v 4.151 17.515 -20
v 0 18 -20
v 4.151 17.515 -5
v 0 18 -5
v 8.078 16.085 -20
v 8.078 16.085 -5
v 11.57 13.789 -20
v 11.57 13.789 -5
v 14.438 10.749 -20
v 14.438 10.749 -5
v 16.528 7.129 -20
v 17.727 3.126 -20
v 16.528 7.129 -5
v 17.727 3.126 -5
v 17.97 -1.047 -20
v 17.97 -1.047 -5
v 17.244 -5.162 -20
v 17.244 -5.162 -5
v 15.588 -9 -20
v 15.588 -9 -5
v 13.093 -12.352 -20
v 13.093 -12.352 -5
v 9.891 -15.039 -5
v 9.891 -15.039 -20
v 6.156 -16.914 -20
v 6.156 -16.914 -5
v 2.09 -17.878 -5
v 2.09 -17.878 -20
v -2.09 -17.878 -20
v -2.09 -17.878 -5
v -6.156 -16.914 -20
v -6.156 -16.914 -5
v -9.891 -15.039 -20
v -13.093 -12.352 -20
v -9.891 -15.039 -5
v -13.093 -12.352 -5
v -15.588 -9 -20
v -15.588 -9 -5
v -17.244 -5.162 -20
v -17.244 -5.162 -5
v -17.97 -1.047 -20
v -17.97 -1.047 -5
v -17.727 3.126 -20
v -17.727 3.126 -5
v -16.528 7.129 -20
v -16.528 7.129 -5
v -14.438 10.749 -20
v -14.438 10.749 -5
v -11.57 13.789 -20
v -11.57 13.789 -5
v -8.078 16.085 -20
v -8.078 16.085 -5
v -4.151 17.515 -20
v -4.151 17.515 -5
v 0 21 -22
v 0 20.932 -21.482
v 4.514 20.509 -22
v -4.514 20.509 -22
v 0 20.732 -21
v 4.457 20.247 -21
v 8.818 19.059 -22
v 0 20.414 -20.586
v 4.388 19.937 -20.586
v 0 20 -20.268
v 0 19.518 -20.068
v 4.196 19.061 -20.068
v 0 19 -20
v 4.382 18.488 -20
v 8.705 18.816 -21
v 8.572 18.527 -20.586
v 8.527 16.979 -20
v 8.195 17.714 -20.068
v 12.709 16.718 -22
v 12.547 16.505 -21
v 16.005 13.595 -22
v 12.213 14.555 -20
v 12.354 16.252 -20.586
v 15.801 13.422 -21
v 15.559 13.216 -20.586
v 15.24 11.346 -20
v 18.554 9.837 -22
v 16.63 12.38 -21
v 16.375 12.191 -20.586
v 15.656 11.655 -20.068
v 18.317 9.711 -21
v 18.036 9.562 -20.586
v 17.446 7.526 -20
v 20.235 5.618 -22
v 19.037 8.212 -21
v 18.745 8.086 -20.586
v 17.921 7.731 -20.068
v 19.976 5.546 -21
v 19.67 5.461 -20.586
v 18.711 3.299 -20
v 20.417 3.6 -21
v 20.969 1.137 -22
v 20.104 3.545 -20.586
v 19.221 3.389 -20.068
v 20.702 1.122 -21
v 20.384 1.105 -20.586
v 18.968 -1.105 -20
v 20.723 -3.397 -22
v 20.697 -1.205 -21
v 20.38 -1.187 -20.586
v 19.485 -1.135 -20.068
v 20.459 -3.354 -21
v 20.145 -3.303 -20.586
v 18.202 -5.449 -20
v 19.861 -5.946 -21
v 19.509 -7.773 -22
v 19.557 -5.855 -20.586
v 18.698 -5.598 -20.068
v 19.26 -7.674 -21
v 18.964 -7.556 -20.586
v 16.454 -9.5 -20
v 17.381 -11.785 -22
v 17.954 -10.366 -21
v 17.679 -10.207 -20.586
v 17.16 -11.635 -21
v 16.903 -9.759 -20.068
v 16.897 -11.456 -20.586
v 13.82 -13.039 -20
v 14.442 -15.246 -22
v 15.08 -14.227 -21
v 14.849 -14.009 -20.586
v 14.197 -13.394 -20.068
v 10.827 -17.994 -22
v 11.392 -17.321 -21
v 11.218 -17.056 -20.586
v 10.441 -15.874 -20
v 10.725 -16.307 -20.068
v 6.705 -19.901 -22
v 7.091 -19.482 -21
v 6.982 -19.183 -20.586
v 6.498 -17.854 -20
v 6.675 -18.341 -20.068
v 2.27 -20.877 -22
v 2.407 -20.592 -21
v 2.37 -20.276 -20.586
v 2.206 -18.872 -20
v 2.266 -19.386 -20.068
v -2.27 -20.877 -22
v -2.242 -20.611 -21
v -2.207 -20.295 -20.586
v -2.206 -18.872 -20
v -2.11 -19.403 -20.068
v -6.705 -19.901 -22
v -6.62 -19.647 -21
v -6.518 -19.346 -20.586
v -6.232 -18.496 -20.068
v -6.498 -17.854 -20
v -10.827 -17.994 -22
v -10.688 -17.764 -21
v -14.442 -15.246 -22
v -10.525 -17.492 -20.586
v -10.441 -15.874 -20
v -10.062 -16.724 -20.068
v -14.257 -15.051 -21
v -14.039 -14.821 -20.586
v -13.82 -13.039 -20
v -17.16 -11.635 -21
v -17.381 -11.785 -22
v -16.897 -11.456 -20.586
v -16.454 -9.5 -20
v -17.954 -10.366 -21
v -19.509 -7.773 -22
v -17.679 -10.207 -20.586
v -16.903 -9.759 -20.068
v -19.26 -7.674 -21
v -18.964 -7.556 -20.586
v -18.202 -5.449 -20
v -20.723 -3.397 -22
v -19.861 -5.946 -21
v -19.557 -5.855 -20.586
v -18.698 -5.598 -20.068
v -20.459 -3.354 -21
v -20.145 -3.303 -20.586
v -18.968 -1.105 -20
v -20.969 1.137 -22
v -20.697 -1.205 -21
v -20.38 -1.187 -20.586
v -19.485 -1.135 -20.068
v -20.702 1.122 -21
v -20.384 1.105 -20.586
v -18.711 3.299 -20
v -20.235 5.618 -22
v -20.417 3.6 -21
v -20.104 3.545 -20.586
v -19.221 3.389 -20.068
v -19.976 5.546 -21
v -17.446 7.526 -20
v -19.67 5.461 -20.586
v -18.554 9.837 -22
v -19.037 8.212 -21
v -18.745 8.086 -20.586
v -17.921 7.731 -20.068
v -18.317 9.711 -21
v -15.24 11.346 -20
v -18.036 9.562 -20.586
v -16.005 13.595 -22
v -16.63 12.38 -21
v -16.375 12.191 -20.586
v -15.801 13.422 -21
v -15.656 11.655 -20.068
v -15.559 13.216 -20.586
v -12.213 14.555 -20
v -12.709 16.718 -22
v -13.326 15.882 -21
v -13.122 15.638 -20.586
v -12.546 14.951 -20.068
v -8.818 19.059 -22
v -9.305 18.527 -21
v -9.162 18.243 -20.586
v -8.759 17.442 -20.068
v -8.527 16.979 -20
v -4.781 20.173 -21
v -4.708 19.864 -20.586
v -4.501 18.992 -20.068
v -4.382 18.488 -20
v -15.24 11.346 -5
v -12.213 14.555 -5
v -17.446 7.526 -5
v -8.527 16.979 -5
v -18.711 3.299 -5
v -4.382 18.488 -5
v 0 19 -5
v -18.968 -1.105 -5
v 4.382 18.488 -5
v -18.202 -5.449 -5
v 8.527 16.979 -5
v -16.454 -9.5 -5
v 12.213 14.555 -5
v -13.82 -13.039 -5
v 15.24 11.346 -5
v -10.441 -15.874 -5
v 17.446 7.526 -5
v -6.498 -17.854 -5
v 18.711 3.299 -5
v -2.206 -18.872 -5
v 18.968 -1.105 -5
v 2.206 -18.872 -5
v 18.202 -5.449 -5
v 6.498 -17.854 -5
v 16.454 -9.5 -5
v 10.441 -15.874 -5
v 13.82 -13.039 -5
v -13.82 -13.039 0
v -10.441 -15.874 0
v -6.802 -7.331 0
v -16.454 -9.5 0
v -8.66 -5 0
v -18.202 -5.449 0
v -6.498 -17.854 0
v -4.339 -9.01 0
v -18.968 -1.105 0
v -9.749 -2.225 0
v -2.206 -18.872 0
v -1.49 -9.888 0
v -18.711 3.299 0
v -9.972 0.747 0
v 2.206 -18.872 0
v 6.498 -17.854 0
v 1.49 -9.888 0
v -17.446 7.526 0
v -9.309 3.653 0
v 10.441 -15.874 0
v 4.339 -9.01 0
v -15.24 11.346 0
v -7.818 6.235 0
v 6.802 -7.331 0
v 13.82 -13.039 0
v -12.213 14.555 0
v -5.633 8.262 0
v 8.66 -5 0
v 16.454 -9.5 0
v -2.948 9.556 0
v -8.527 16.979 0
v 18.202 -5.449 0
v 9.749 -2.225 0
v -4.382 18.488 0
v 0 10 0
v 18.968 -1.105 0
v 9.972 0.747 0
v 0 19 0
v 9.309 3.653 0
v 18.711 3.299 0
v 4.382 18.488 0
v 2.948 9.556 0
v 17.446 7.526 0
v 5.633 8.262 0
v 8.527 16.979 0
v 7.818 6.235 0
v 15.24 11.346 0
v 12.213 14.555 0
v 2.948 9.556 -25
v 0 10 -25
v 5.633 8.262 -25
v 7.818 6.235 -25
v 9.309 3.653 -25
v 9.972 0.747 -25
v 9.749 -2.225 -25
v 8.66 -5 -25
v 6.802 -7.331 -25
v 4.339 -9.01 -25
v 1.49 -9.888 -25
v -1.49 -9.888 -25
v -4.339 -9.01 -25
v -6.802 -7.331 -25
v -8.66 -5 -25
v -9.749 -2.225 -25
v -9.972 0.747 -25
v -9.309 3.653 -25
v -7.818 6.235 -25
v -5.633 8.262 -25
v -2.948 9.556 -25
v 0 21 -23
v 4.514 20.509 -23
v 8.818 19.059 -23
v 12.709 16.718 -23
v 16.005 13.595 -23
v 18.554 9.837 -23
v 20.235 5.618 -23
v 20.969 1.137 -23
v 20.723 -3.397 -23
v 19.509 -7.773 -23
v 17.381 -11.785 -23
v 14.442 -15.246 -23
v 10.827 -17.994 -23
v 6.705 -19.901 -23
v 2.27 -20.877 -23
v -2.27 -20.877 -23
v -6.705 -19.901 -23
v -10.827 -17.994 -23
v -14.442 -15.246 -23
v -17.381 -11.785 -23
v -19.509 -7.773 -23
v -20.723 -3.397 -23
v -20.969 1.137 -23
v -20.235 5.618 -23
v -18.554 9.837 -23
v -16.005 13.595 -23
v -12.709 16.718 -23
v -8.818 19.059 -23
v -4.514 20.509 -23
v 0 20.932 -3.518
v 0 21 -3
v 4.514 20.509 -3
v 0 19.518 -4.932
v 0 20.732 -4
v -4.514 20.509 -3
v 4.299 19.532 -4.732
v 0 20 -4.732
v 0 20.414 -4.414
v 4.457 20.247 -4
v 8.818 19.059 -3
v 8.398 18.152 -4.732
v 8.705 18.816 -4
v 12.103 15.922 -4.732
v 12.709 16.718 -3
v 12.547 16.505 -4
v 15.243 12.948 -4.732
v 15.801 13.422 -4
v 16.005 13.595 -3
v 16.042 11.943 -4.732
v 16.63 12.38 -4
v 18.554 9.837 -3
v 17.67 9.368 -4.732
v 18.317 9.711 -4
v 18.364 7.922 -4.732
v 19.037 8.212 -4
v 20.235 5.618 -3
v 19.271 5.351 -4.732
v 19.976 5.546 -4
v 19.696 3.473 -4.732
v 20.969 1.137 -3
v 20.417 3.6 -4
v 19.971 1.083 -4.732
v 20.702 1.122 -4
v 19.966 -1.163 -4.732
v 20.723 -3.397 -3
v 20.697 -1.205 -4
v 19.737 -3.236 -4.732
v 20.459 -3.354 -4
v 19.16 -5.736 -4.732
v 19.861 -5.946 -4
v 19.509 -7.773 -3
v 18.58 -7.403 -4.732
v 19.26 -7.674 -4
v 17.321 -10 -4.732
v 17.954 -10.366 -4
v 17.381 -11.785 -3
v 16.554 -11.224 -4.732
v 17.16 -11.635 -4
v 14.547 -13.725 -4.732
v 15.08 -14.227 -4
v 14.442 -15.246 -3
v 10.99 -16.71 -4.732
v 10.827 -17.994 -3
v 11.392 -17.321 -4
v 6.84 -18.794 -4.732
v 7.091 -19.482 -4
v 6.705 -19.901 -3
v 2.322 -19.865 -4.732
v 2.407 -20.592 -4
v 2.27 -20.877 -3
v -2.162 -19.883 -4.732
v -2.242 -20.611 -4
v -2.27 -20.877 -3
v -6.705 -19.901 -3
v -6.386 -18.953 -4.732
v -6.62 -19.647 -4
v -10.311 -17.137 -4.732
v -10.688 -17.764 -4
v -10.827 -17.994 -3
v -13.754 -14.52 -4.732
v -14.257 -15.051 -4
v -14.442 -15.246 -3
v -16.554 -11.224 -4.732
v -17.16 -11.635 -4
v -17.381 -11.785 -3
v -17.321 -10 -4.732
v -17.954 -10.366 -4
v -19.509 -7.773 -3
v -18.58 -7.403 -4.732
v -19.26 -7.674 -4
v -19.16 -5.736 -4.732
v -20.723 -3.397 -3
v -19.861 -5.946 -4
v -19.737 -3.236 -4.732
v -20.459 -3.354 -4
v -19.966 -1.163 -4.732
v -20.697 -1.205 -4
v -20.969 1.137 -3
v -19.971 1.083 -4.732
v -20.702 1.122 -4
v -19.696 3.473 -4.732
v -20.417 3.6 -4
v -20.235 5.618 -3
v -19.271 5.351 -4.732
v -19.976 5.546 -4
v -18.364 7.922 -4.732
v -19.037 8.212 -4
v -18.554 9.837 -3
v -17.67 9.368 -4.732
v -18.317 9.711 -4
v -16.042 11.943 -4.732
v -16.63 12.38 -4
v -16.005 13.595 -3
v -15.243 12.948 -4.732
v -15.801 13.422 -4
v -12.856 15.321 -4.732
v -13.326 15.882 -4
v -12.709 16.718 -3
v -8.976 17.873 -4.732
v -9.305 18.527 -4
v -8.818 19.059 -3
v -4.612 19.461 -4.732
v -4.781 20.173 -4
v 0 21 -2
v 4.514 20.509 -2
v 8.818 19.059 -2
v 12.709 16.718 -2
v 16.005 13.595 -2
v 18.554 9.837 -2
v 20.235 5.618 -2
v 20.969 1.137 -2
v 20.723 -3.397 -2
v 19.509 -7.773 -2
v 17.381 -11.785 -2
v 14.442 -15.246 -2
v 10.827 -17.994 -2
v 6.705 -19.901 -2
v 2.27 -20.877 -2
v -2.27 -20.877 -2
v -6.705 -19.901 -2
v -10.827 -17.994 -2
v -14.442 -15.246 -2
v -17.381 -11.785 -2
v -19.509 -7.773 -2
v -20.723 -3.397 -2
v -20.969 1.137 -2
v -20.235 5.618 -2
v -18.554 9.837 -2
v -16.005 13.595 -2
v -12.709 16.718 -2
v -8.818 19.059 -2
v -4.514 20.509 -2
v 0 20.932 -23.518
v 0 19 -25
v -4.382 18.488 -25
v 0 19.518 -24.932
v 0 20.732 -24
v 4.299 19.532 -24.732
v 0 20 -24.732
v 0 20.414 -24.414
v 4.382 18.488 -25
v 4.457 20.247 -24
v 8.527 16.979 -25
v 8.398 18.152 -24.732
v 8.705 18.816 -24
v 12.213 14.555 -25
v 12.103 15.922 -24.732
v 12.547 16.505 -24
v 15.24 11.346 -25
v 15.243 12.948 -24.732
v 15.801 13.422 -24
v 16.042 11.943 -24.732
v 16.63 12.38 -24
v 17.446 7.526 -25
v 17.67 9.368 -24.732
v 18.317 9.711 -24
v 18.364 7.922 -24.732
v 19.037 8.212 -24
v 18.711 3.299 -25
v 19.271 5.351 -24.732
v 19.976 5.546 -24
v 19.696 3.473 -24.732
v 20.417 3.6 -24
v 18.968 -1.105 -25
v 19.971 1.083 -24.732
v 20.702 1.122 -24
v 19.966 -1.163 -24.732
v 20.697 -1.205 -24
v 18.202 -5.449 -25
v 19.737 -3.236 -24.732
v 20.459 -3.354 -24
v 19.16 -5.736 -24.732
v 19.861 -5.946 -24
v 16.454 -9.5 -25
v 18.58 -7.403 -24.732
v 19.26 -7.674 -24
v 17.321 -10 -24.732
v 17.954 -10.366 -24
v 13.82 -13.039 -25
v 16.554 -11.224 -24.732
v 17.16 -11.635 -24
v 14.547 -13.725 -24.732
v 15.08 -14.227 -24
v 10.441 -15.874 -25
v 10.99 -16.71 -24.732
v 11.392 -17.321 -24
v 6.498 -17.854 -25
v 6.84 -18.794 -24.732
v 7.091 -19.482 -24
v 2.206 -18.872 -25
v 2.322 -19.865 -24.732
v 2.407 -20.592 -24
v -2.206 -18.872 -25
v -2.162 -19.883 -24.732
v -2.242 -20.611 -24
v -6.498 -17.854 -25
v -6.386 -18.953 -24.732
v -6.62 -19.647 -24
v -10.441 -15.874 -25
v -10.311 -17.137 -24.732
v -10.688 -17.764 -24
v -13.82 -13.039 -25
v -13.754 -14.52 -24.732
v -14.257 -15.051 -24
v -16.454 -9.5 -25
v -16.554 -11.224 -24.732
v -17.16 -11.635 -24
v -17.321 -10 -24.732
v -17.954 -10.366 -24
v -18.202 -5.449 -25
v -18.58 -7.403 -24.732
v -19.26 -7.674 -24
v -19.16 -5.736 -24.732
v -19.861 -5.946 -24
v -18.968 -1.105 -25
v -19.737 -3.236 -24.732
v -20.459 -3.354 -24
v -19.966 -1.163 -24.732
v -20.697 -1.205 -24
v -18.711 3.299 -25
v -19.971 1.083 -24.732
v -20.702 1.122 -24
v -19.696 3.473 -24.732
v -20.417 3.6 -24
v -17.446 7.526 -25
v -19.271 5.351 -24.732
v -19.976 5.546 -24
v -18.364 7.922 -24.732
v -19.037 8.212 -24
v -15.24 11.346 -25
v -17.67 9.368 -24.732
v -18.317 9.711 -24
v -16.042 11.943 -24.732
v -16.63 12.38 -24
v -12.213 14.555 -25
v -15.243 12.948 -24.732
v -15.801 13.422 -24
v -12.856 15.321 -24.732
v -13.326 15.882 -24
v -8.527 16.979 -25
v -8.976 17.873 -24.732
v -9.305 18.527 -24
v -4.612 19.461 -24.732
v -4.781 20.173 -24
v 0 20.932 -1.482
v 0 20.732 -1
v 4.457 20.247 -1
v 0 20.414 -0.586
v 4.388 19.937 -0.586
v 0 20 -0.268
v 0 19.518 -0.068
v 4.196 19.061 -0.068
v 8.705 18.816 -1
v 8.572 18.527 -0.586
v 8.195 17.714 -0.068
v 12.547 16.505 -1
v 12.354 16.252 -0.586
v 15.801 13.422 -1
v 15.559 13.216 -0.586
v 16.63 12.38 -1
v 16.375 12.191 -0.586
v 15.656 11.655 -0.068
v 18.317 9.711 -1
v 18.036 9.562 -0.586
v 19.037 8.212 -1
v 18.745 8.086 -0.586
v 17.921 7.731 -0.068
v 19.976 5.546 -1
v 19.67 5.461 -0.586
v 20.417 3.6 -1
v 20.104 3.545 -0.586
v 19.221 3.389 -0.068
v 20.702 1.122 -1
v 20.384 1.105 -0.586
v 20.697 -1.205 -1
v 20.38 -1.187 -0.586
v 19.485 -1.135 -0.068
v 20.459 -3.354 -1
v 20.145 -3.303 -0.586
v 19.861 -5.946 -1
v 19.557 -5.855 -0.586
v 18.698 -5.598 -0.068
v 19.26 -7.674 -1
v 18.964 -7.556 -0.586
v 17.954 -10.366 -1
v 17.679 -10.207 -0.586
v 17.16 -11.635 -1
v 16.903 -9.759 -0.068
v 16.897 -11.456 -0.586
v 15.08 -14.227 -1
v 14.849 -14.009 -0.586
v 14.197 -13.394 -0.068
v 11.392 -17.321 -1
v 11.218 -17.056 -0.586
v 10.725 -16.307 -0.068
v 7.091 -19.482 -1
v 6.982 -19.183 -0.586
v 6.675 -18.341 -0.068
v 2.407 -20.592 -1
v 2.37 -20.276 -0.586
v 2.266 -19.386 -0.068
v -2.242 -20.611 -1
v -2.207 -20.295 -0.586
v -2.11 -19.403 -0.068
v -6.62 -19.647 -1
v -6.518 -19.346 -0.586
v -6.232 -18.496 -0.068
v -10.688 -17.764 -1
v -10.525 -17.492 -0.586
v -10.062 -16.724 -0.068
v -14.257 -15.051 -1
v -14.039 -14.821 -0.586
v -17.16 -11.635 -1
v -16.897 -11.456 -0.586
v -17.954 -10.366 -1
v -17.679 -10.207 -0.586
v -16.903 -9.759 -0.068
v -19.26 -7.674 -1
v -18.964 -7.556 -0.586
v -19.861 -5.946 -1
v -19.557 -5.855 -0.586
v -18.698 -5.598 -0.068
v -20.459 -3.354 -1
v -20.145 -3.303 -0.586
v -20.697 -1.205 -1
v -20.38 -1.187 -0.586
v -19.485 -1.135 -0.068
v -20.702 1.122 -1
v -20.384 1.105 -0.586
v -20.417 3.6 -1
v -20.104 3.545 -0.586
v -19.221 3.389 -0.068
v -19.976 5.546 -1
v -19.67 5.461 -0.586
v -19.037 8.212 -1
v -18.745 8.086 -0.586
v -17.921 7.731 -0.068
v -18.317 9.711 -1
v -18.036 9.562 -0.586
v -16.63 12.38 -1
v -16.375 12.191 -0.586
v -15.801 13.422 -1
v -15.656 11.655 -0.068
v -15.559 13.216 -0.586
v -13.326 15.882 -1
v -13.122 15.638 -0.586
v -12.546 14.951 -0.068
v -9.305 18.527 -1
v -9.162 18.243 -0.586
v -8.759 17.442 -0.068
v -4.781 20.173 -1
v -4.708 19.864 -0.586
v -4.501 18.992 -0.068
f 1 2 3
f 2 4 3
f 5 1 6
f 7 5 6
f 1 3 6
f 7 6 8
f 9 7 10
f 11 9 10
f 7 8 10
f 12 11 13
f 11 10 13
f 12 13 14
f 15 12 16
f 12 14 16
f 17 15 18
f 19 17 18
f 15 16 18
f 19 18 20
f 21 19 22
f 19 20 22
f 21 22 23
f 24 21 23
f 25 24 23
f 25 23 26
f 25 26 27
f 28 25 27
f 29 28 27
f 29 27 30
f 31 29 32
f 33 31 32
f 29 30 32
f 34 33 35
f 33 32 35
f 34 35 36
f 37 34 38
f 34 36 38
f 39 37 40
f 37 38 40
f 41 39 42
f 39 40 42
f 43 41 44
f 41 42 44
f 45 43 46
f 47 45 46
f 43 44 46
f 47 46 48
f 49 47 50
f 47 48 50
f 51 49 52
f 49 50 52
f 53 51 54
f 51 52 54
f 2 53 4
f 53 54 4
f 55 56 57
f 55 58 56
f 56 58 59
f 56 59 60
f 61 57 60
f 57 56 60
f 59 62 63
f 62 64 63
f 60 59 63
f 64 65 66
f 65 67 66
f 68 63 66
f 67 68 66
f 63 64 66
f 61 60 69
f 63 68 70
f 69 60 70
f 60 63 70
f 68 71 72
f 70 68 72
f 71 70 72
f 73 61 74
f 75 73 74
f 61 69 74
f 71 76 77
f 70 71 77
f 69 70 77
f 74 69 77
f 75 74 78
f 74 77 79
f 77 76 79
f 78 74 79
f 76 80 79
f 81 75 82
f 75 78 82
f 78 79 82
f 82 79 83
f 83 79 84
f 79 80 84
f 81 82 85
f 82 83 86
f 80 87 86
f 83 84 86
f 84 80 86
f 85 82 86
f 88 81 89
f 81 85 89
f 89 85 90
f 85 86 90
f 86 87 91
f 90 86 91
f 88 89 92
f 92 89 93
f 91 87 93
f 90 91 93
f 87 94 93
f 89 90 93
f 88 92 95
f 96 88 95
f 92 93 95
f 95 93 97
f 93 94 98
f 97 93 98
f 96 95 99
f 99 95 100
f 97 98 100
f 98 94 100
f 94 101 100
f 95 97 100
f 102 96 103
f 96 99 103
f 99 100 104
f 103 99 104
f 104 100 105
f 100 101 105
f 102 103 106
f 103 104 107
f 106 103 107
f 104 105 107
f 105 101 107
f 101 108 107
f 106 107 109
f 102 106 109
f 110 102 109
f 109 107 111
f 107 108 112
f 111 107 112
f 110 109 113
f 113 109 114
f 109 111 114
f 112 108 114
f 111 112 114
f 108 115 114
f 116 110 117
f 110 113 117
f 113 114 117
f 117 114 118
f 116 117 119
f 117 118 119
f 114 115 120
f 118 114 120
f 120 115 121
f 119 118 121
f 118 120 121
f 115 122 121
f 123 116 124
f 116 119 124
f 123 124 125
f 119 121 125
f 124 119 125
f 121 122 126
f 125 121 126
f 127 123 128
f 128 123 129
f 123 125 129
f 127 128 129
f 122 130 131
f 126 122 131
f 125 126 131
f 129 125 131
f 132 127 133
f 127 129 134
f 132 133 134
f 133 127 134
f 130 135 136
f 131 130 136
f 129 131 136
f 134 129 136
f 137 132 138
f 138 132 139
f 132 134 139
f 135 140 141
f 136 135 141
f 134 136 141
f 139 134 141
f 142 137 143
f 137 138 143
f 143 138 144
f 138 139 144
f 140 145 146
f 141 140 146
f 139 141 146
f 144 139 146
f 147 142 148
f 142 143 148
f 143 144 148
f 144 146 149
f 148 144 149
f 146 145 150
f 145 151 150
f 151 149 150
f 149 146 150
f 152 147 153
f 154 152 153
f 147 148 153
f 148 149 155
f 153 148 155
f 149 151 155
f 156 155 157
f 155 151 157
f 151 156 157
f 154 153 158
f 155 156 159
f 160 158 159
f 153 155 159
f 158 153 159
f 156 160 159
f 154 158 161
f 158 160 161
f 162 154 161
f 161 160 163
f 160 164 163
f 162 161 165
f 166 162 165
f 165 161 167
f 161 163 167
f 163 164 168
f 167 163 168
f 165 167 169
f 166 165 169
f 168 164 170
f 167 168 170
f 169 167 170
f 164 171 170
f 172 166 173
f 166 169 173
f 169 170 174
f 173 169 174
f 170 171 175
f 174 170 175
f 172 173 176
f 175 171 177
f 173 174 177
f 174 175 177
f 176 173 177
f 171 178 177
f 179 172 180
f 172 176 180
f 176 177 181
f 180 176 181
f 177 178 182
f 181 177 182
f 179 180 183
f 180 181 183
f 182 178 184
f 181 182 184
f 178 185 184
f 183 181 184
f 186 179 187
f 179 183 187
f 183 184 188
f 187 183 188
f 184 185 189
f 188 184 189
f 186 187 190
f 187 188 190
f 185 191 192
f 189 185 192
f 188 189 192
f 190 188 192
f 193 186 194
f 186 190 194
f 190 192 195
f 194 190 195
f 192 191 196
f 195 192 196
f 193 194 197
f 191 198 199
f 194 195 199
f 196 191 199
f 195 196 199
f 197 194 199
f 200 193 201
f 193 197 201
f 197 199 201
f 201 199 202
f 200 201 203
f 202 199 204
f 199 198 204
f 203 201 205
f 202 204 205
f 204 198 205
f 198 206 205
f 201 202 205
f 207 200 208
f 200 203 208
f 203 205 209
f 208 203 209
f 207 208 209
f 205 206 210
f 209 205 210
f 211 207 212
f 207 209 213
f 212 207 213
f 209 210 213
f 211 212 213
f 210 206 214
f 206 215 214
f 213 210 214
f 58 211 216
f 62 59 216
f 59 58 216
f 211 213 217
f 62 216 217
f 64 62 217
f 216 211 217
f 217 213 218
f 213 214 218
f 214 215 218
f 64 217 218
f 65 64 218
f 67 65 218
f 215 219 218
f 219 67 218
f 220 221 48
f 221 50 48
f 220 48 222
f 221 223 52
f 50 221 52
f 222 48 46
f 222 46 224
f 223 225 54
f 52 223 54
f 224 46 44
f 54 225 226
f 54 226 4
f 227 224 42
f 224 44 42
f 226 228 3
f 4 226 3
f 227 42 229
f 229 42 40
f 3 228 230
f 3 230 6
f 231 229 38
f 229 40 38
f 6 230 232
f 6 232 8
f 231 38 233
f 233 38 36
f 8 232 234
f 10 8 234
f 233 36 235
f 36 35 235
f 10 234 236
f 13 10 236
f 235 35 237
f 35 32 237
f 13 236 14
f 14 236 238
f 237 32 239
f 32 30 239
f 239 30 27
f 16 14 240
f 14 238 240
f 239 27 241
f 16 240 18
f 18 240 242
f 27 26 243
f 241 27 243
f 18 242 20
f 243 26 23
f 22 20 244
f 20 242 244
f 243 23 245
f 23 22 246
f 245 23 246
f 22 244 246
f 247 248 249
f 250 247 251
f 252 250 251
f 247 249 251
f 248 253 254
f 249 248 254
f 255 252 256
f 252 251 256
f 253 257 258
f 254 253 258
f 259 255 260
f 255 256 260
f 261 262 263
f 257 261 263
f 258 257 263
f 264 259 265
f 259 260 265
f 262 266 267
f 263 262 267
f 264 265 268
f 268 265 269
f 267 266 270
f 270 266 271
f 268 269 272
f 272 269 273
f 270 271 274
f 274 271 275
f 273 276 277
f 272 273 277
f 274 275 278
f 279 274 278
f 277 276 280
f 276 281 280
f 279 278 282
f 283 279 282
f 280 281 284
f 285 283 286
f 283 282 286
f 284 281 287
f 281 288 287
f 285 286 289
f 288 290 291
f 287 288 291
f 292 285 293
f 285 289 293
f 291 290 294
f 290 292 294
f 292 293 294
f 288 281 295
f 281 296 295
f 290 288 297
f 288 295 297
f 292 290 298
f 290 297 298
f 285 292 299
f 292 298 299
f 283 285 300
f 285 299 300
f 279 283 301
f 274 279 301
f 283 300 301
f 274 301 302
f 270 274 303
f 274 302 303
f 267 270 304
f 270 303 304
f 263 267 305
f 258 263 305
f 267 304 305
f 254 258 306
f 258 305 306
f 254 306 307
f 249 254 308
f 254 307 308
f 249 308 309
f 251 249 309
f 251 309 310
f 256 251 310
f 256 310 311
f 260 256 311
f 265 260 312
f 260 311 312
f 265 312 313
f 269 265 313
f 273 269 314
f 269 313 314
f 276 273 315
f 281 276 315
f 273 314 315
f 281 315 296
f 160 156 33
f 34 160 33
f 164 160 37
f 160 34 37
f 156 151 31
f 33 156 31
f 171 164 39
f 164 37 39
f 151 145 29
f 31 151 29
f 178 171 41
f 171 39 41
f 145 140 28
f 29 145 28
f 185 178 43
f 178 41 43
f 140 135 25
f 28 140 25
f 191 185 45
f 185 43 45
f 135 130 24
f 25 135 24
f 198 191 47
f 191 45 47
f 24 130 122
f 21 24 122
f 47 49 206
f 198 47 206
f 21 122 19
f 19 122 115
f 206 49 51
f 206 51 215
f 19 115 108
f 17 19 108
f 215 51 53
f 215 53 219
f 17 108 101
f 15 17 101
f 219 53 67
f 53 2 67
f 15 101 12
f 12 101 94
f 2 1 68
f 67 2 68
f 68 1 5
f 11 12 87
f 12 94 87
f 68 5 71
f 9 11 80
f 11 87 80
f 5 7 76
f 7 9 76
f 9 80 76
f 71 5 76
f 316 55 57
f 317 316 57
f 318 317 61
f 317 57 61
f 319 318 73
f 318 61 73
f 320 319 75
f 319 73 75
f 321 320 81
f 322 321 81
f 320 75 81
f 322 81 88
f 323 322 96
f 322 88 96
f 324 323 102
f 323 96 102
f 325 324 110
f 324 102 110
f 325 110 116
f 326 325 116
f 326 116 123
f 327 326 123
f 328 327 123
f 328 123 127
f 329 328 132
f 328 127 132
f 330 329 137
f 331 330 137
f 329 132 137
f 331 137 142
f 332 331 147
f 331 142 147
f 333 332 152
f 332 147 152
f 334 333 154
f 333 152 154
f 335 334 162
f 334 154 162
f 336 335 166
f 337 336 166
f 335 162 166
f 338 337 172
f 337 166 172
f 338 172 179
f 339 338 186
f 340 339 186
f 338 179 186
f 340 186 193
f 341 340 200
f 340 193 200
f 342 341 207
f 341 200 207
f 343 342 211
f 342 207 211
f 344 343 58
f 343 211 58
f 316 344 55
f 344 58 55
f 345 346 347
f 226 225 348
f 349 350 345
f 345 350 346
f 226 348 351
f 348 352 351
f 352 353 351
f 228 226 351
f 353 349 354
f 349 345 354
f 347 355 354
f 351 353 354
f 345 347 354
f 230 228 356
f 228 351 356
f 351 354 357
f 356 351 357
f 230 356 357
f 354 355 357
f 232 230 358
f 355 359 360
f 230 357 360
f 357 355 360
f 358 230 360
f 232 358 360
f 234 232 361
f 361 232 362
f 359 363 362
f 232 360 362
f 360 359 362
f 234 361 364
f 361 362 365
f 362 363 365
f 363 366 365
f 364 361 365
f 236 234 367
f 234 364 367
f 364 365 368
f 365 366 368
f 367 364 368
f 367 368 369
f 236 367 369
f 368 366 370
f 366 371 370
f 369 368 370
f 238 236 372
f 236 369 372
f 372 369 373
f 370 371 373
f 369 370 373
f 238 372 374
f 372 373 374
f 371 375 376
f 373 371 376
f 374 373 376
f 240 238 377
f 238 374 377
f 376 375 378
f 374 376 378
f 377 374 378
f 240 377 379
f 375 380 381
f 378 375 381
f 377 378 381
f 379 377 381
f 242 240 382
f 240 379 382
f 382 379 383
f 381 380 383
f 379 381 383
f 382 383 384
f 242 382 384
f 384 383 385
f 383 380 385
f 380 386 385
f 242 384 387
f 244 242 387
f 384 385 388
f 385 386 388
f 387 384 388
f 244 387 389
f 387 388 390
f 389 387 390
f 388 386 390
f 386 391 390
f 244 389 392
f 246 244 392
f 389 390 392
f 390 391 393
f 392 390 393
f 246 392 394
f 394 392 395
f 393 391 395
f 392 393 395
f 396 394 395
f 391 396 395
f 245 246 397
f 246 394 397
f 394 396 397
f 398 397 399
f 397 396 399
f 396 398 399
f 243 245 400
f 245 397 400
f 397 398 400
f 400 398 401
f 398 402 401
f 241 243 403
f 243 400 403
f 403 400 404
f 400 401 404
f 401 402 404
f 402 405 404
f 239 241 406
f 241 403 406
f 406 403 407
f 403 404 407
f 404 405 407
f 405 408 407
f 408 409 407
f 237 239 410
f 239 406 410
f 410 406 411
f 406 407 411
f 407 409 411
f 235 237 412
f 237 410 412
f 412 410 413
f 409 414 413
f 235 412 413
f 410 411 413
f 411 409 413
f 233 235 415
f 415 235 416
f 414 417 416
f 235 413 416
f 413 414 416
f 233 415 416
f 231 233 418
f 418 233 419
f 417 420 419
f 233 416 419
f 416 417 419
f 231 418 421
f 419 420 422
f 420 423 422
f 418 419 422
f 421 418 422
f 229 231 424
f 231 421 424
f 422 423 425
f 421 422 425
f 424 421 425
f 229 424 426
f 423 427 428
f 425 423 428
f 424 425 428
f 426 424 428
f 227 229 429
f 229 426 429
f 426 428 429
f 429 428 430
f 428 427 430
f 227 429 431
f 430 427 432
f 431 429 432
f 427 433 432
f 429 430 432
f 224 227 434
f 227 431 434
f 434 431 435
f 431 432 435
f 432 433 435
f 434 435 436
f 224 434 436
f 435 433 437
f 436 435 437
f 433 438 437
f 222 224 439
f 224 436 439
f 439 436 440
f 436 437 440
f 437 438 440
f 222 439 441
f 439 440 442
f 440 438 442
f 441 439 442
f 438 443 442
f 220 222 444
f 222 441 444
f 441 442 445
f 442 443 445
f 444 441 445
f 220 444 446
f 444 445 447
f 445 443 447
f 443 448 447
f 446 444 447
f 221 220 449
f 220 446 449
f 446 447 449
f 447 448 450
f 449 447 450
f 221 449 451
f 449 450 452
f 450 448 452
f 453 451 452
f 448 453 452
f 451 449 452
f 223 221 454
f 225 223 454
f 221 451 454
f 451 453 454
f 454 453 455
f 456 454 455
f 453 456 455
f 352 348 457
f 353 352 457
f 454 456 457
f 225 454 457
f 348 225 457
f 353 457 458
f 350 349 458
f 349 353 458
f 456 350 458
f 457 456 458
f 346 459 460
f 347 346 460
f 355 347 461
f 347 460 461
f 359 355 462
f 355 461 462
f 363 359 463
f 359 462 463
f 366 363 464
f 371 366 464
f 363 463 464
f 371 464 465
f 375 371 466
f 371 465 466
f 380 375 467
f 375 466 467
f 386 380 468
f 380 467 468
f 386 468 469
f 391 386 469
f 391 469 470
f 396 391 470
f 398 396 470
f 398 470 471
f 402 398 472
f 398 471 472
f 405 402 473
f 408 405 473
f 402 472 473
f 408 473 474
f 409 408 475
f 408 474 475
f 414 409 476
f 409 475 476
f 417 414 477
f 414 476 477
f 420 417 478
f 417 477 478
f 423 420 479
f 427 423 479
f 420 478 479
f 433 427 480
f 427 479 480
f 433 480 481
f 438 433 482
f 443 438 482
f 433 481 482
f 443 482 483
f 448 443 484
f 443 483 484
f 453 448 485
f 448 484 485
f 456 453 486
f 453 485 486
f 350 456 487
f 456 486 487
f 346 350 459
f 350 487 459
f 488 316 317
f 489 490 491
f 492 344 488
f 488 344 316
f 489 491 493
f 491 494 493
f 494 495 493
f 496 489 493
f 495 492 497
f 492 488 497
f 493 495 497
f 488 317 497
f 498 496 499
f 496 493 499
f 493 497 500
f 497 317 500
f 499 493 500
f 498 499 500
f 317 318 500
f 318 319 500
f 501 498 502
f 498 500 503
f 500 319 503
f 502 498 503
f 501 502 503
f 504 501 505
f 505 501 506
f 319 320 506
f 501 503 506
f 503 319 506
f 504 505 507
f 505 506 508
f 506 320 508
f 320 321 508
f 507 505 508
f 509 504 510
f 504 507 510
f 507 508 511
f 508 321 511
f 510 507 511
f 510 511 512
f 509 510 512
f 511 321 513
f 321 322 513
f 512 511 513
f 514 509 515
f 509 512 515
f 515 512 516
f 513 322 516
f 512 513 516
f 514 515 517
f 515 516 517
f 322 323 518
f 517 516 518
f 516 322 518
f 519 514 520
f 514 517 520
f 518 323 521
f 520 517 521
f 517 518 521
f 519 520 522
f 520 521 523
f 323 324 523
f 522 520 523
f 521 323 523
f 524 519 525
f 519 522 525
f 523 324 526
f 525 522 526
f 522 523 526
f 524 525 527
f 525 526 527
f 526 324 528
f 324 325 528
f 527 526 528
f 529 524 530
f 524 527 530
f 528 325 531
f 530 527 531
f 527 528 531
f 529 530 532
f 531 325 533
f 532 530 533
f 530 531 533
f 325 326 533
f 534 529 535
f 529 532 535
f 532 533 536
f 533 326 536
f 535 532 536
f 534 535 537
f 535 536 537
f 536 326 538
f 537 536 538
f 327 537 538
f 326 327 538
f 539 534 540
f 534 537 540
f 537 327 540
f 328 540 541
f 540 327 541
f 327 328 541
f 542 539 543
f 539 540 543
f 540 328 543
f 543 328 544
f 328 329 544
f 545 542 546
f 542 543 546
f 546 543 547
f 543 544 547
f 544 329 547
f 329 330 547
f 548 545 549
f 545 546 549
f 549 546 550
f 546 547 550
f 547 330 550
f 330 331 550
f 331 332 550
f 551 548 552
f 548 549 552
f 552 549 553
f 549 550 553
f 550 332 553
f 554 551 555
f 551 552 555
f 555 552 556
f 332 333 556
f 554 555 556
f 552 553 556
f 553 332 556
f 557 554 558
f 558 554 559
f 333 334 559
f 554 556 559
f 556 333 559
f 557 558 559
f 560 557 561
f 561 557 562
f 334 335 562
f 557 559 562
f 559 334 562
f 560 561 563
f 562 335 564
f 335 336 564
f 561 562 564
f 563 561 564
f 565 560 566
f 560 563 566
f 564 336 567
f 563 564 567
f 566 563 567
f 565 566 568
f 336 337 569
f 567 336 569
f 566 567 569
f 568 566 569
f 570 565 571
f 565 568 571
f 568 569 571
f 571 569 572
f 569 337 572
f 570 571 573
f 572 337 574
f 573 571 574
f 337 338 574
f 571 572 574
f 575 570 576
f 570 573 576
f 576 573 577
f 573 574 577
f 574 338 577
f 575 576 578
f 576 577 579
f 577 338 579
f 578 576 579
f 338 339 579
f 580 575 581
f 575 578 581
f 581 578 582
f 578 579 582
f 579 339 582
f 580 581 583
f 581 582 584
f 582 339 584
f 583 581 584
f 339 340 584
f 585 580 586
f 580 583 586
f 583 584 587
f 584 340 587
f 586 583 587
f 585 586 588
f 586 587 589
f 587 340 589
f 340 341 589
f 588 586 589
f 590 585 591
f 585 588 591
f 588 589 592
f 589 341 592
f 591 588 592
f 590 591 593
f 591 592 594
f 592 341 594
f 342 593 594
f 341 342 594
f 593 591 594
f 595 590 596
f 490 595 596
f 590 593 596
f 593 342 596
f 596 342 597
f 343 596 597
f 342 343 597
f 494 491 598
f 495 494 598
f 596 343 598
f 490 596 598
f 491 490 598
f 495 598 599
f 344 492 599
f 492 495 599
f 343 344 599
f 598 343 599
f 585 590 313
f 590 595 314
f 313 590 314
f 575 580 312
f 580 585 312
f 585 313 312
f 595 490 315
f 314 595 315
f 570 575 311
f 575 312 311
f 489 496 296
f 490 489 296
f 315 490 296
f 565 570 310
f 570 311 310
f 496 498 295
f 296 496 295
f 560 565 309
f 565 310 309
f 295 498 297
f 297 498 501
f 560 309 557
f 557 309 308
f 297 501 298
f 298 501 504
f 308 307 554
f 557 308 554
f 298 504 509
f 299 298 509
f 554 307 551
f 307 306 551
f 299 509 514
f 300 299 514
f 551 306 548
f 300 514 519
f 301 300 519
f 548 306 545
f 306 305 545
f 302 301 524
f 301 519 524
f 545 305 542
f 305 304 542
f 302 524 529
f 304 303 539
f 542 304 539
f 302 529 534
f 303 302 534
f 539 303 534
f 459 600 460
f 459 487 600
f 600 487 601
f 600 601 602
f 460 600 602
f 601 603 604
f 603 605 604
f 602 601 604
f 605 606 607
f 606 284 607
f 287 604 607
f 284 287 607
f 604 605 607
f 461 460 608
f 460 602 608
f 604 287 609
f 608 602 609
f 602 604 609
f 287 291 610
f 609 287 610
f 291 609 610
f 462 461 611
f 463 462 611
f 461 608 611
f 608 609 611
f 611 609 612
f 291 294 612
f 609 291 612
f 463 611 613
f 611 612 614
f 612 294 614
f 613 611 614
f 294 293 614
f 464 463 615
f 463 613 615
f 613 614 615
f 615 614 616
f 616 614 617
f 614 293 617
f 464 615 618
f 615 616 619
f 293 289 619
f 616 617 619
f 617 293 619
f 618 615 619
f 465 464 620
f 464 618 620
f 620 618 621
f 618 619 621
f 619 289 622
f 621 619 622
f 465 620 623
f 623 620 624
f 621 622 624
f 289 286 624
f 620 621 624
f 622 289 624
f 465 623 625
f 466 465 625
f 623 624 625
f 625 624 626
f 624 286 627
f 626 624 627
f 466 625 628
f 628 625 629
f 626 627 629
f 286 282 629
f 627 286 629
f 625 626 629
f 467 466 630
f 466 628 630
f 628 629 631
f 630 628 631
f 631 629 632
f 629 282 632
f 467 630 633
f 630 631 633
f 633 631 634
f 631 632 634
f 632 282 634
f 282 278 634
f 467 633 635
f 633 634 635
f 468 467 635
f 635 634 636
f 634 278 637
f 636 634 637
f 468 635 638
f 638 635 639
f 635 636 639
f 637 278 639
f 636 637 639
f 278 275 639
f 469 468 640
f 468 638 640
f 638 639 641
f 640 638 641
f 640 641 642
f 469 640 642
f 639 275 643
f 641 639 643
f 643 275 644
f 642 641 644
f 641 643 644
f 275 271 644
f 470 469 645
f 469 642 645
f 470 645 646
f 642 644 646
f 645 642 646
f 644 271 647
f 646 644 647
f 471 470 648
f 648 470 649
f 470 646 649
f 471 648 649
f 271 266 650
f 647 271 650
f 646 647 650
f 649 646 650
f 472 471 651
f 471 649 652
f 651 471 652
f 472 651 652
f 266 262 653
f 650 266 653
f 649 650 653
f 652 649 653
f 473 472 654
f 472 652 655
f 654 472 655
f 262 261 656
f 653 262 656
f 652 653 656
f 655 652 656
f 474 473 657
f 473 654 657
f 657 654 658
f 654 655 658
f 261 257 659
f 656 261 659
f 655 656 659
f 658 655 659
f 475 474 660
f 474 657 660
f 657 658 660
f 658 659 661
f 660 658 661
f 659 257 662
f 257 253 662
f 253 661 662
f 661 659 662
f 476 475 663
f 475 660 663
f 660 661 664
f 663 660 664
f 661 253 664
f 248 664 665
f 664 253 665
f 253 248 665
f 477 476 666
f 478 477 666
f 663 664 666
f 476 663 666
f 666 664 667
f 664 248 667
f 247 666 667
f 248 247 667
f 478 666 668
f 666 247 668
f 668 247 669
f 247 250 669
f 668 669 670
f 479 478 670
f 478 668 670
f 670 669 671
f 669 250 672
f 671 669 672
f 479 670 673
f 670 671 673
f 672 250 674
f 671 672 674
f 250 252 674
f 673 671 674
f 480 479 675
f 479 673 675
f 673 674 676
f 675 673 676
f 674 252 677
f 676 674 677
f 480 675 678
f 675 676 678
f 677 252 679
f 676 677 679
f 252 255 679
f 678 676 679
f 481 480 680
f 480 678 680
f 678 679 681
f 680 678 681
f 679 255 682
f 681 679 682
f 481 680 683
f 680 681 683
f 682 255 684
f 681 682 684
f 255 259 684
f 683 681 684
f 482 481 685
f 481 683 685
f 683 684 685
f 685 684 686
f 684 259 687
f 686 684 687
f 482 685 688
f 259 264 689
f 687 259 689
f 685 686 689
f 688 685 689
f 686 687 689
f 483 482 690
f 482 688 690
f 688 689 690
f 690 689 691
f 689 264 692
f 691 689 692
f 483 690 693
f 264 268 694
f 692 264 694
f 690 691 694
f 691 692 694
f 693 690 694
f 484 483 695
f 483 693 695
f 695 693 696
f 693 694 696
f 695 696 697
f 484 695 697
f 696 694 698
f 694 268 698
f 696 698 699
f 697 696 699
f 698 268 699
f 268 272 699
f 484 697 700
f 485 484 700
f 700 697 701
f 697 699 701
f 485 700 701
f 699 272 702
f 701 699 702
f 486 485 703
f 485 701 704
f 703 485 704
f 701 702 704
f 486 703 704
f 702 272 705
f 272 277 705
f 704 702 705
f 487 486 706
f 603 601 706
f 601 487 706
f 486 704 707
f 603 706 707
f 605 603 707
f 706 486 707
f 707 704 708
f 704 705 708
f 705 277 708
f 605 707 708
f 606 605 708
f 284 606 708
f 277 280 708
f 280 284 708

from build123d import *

# Parameters (mm, degrees)
FILLET1_R = 2


with BuildPart() as part:
    # Sketch1 → Revolve1 (revolve)
    with BuildSketch(Plane(origin=(0, 0, 0), x_dir=(0, 0, -1), z_dir=(1, 0, 0))):
        Polygon((0, 10), (25, 10), (25, 21), (20, 21), (20, 18), (5, 18), (5, 21), (0, 21), align=None)
    revolve(axis=Axis((0, 0, 0), (0, 0, -1)))

    # Fillet1
    fillet1_edges = [part.edges().sort_by_distance(p)[0] for p in [
        (0, -21, 0),
        (0, -21, -5),
        (0, -21, -20),
        (0, -21, -25),
    ]]
    fillet(fillet1_edges, radius=FILLET1_R)


solid = part.part
